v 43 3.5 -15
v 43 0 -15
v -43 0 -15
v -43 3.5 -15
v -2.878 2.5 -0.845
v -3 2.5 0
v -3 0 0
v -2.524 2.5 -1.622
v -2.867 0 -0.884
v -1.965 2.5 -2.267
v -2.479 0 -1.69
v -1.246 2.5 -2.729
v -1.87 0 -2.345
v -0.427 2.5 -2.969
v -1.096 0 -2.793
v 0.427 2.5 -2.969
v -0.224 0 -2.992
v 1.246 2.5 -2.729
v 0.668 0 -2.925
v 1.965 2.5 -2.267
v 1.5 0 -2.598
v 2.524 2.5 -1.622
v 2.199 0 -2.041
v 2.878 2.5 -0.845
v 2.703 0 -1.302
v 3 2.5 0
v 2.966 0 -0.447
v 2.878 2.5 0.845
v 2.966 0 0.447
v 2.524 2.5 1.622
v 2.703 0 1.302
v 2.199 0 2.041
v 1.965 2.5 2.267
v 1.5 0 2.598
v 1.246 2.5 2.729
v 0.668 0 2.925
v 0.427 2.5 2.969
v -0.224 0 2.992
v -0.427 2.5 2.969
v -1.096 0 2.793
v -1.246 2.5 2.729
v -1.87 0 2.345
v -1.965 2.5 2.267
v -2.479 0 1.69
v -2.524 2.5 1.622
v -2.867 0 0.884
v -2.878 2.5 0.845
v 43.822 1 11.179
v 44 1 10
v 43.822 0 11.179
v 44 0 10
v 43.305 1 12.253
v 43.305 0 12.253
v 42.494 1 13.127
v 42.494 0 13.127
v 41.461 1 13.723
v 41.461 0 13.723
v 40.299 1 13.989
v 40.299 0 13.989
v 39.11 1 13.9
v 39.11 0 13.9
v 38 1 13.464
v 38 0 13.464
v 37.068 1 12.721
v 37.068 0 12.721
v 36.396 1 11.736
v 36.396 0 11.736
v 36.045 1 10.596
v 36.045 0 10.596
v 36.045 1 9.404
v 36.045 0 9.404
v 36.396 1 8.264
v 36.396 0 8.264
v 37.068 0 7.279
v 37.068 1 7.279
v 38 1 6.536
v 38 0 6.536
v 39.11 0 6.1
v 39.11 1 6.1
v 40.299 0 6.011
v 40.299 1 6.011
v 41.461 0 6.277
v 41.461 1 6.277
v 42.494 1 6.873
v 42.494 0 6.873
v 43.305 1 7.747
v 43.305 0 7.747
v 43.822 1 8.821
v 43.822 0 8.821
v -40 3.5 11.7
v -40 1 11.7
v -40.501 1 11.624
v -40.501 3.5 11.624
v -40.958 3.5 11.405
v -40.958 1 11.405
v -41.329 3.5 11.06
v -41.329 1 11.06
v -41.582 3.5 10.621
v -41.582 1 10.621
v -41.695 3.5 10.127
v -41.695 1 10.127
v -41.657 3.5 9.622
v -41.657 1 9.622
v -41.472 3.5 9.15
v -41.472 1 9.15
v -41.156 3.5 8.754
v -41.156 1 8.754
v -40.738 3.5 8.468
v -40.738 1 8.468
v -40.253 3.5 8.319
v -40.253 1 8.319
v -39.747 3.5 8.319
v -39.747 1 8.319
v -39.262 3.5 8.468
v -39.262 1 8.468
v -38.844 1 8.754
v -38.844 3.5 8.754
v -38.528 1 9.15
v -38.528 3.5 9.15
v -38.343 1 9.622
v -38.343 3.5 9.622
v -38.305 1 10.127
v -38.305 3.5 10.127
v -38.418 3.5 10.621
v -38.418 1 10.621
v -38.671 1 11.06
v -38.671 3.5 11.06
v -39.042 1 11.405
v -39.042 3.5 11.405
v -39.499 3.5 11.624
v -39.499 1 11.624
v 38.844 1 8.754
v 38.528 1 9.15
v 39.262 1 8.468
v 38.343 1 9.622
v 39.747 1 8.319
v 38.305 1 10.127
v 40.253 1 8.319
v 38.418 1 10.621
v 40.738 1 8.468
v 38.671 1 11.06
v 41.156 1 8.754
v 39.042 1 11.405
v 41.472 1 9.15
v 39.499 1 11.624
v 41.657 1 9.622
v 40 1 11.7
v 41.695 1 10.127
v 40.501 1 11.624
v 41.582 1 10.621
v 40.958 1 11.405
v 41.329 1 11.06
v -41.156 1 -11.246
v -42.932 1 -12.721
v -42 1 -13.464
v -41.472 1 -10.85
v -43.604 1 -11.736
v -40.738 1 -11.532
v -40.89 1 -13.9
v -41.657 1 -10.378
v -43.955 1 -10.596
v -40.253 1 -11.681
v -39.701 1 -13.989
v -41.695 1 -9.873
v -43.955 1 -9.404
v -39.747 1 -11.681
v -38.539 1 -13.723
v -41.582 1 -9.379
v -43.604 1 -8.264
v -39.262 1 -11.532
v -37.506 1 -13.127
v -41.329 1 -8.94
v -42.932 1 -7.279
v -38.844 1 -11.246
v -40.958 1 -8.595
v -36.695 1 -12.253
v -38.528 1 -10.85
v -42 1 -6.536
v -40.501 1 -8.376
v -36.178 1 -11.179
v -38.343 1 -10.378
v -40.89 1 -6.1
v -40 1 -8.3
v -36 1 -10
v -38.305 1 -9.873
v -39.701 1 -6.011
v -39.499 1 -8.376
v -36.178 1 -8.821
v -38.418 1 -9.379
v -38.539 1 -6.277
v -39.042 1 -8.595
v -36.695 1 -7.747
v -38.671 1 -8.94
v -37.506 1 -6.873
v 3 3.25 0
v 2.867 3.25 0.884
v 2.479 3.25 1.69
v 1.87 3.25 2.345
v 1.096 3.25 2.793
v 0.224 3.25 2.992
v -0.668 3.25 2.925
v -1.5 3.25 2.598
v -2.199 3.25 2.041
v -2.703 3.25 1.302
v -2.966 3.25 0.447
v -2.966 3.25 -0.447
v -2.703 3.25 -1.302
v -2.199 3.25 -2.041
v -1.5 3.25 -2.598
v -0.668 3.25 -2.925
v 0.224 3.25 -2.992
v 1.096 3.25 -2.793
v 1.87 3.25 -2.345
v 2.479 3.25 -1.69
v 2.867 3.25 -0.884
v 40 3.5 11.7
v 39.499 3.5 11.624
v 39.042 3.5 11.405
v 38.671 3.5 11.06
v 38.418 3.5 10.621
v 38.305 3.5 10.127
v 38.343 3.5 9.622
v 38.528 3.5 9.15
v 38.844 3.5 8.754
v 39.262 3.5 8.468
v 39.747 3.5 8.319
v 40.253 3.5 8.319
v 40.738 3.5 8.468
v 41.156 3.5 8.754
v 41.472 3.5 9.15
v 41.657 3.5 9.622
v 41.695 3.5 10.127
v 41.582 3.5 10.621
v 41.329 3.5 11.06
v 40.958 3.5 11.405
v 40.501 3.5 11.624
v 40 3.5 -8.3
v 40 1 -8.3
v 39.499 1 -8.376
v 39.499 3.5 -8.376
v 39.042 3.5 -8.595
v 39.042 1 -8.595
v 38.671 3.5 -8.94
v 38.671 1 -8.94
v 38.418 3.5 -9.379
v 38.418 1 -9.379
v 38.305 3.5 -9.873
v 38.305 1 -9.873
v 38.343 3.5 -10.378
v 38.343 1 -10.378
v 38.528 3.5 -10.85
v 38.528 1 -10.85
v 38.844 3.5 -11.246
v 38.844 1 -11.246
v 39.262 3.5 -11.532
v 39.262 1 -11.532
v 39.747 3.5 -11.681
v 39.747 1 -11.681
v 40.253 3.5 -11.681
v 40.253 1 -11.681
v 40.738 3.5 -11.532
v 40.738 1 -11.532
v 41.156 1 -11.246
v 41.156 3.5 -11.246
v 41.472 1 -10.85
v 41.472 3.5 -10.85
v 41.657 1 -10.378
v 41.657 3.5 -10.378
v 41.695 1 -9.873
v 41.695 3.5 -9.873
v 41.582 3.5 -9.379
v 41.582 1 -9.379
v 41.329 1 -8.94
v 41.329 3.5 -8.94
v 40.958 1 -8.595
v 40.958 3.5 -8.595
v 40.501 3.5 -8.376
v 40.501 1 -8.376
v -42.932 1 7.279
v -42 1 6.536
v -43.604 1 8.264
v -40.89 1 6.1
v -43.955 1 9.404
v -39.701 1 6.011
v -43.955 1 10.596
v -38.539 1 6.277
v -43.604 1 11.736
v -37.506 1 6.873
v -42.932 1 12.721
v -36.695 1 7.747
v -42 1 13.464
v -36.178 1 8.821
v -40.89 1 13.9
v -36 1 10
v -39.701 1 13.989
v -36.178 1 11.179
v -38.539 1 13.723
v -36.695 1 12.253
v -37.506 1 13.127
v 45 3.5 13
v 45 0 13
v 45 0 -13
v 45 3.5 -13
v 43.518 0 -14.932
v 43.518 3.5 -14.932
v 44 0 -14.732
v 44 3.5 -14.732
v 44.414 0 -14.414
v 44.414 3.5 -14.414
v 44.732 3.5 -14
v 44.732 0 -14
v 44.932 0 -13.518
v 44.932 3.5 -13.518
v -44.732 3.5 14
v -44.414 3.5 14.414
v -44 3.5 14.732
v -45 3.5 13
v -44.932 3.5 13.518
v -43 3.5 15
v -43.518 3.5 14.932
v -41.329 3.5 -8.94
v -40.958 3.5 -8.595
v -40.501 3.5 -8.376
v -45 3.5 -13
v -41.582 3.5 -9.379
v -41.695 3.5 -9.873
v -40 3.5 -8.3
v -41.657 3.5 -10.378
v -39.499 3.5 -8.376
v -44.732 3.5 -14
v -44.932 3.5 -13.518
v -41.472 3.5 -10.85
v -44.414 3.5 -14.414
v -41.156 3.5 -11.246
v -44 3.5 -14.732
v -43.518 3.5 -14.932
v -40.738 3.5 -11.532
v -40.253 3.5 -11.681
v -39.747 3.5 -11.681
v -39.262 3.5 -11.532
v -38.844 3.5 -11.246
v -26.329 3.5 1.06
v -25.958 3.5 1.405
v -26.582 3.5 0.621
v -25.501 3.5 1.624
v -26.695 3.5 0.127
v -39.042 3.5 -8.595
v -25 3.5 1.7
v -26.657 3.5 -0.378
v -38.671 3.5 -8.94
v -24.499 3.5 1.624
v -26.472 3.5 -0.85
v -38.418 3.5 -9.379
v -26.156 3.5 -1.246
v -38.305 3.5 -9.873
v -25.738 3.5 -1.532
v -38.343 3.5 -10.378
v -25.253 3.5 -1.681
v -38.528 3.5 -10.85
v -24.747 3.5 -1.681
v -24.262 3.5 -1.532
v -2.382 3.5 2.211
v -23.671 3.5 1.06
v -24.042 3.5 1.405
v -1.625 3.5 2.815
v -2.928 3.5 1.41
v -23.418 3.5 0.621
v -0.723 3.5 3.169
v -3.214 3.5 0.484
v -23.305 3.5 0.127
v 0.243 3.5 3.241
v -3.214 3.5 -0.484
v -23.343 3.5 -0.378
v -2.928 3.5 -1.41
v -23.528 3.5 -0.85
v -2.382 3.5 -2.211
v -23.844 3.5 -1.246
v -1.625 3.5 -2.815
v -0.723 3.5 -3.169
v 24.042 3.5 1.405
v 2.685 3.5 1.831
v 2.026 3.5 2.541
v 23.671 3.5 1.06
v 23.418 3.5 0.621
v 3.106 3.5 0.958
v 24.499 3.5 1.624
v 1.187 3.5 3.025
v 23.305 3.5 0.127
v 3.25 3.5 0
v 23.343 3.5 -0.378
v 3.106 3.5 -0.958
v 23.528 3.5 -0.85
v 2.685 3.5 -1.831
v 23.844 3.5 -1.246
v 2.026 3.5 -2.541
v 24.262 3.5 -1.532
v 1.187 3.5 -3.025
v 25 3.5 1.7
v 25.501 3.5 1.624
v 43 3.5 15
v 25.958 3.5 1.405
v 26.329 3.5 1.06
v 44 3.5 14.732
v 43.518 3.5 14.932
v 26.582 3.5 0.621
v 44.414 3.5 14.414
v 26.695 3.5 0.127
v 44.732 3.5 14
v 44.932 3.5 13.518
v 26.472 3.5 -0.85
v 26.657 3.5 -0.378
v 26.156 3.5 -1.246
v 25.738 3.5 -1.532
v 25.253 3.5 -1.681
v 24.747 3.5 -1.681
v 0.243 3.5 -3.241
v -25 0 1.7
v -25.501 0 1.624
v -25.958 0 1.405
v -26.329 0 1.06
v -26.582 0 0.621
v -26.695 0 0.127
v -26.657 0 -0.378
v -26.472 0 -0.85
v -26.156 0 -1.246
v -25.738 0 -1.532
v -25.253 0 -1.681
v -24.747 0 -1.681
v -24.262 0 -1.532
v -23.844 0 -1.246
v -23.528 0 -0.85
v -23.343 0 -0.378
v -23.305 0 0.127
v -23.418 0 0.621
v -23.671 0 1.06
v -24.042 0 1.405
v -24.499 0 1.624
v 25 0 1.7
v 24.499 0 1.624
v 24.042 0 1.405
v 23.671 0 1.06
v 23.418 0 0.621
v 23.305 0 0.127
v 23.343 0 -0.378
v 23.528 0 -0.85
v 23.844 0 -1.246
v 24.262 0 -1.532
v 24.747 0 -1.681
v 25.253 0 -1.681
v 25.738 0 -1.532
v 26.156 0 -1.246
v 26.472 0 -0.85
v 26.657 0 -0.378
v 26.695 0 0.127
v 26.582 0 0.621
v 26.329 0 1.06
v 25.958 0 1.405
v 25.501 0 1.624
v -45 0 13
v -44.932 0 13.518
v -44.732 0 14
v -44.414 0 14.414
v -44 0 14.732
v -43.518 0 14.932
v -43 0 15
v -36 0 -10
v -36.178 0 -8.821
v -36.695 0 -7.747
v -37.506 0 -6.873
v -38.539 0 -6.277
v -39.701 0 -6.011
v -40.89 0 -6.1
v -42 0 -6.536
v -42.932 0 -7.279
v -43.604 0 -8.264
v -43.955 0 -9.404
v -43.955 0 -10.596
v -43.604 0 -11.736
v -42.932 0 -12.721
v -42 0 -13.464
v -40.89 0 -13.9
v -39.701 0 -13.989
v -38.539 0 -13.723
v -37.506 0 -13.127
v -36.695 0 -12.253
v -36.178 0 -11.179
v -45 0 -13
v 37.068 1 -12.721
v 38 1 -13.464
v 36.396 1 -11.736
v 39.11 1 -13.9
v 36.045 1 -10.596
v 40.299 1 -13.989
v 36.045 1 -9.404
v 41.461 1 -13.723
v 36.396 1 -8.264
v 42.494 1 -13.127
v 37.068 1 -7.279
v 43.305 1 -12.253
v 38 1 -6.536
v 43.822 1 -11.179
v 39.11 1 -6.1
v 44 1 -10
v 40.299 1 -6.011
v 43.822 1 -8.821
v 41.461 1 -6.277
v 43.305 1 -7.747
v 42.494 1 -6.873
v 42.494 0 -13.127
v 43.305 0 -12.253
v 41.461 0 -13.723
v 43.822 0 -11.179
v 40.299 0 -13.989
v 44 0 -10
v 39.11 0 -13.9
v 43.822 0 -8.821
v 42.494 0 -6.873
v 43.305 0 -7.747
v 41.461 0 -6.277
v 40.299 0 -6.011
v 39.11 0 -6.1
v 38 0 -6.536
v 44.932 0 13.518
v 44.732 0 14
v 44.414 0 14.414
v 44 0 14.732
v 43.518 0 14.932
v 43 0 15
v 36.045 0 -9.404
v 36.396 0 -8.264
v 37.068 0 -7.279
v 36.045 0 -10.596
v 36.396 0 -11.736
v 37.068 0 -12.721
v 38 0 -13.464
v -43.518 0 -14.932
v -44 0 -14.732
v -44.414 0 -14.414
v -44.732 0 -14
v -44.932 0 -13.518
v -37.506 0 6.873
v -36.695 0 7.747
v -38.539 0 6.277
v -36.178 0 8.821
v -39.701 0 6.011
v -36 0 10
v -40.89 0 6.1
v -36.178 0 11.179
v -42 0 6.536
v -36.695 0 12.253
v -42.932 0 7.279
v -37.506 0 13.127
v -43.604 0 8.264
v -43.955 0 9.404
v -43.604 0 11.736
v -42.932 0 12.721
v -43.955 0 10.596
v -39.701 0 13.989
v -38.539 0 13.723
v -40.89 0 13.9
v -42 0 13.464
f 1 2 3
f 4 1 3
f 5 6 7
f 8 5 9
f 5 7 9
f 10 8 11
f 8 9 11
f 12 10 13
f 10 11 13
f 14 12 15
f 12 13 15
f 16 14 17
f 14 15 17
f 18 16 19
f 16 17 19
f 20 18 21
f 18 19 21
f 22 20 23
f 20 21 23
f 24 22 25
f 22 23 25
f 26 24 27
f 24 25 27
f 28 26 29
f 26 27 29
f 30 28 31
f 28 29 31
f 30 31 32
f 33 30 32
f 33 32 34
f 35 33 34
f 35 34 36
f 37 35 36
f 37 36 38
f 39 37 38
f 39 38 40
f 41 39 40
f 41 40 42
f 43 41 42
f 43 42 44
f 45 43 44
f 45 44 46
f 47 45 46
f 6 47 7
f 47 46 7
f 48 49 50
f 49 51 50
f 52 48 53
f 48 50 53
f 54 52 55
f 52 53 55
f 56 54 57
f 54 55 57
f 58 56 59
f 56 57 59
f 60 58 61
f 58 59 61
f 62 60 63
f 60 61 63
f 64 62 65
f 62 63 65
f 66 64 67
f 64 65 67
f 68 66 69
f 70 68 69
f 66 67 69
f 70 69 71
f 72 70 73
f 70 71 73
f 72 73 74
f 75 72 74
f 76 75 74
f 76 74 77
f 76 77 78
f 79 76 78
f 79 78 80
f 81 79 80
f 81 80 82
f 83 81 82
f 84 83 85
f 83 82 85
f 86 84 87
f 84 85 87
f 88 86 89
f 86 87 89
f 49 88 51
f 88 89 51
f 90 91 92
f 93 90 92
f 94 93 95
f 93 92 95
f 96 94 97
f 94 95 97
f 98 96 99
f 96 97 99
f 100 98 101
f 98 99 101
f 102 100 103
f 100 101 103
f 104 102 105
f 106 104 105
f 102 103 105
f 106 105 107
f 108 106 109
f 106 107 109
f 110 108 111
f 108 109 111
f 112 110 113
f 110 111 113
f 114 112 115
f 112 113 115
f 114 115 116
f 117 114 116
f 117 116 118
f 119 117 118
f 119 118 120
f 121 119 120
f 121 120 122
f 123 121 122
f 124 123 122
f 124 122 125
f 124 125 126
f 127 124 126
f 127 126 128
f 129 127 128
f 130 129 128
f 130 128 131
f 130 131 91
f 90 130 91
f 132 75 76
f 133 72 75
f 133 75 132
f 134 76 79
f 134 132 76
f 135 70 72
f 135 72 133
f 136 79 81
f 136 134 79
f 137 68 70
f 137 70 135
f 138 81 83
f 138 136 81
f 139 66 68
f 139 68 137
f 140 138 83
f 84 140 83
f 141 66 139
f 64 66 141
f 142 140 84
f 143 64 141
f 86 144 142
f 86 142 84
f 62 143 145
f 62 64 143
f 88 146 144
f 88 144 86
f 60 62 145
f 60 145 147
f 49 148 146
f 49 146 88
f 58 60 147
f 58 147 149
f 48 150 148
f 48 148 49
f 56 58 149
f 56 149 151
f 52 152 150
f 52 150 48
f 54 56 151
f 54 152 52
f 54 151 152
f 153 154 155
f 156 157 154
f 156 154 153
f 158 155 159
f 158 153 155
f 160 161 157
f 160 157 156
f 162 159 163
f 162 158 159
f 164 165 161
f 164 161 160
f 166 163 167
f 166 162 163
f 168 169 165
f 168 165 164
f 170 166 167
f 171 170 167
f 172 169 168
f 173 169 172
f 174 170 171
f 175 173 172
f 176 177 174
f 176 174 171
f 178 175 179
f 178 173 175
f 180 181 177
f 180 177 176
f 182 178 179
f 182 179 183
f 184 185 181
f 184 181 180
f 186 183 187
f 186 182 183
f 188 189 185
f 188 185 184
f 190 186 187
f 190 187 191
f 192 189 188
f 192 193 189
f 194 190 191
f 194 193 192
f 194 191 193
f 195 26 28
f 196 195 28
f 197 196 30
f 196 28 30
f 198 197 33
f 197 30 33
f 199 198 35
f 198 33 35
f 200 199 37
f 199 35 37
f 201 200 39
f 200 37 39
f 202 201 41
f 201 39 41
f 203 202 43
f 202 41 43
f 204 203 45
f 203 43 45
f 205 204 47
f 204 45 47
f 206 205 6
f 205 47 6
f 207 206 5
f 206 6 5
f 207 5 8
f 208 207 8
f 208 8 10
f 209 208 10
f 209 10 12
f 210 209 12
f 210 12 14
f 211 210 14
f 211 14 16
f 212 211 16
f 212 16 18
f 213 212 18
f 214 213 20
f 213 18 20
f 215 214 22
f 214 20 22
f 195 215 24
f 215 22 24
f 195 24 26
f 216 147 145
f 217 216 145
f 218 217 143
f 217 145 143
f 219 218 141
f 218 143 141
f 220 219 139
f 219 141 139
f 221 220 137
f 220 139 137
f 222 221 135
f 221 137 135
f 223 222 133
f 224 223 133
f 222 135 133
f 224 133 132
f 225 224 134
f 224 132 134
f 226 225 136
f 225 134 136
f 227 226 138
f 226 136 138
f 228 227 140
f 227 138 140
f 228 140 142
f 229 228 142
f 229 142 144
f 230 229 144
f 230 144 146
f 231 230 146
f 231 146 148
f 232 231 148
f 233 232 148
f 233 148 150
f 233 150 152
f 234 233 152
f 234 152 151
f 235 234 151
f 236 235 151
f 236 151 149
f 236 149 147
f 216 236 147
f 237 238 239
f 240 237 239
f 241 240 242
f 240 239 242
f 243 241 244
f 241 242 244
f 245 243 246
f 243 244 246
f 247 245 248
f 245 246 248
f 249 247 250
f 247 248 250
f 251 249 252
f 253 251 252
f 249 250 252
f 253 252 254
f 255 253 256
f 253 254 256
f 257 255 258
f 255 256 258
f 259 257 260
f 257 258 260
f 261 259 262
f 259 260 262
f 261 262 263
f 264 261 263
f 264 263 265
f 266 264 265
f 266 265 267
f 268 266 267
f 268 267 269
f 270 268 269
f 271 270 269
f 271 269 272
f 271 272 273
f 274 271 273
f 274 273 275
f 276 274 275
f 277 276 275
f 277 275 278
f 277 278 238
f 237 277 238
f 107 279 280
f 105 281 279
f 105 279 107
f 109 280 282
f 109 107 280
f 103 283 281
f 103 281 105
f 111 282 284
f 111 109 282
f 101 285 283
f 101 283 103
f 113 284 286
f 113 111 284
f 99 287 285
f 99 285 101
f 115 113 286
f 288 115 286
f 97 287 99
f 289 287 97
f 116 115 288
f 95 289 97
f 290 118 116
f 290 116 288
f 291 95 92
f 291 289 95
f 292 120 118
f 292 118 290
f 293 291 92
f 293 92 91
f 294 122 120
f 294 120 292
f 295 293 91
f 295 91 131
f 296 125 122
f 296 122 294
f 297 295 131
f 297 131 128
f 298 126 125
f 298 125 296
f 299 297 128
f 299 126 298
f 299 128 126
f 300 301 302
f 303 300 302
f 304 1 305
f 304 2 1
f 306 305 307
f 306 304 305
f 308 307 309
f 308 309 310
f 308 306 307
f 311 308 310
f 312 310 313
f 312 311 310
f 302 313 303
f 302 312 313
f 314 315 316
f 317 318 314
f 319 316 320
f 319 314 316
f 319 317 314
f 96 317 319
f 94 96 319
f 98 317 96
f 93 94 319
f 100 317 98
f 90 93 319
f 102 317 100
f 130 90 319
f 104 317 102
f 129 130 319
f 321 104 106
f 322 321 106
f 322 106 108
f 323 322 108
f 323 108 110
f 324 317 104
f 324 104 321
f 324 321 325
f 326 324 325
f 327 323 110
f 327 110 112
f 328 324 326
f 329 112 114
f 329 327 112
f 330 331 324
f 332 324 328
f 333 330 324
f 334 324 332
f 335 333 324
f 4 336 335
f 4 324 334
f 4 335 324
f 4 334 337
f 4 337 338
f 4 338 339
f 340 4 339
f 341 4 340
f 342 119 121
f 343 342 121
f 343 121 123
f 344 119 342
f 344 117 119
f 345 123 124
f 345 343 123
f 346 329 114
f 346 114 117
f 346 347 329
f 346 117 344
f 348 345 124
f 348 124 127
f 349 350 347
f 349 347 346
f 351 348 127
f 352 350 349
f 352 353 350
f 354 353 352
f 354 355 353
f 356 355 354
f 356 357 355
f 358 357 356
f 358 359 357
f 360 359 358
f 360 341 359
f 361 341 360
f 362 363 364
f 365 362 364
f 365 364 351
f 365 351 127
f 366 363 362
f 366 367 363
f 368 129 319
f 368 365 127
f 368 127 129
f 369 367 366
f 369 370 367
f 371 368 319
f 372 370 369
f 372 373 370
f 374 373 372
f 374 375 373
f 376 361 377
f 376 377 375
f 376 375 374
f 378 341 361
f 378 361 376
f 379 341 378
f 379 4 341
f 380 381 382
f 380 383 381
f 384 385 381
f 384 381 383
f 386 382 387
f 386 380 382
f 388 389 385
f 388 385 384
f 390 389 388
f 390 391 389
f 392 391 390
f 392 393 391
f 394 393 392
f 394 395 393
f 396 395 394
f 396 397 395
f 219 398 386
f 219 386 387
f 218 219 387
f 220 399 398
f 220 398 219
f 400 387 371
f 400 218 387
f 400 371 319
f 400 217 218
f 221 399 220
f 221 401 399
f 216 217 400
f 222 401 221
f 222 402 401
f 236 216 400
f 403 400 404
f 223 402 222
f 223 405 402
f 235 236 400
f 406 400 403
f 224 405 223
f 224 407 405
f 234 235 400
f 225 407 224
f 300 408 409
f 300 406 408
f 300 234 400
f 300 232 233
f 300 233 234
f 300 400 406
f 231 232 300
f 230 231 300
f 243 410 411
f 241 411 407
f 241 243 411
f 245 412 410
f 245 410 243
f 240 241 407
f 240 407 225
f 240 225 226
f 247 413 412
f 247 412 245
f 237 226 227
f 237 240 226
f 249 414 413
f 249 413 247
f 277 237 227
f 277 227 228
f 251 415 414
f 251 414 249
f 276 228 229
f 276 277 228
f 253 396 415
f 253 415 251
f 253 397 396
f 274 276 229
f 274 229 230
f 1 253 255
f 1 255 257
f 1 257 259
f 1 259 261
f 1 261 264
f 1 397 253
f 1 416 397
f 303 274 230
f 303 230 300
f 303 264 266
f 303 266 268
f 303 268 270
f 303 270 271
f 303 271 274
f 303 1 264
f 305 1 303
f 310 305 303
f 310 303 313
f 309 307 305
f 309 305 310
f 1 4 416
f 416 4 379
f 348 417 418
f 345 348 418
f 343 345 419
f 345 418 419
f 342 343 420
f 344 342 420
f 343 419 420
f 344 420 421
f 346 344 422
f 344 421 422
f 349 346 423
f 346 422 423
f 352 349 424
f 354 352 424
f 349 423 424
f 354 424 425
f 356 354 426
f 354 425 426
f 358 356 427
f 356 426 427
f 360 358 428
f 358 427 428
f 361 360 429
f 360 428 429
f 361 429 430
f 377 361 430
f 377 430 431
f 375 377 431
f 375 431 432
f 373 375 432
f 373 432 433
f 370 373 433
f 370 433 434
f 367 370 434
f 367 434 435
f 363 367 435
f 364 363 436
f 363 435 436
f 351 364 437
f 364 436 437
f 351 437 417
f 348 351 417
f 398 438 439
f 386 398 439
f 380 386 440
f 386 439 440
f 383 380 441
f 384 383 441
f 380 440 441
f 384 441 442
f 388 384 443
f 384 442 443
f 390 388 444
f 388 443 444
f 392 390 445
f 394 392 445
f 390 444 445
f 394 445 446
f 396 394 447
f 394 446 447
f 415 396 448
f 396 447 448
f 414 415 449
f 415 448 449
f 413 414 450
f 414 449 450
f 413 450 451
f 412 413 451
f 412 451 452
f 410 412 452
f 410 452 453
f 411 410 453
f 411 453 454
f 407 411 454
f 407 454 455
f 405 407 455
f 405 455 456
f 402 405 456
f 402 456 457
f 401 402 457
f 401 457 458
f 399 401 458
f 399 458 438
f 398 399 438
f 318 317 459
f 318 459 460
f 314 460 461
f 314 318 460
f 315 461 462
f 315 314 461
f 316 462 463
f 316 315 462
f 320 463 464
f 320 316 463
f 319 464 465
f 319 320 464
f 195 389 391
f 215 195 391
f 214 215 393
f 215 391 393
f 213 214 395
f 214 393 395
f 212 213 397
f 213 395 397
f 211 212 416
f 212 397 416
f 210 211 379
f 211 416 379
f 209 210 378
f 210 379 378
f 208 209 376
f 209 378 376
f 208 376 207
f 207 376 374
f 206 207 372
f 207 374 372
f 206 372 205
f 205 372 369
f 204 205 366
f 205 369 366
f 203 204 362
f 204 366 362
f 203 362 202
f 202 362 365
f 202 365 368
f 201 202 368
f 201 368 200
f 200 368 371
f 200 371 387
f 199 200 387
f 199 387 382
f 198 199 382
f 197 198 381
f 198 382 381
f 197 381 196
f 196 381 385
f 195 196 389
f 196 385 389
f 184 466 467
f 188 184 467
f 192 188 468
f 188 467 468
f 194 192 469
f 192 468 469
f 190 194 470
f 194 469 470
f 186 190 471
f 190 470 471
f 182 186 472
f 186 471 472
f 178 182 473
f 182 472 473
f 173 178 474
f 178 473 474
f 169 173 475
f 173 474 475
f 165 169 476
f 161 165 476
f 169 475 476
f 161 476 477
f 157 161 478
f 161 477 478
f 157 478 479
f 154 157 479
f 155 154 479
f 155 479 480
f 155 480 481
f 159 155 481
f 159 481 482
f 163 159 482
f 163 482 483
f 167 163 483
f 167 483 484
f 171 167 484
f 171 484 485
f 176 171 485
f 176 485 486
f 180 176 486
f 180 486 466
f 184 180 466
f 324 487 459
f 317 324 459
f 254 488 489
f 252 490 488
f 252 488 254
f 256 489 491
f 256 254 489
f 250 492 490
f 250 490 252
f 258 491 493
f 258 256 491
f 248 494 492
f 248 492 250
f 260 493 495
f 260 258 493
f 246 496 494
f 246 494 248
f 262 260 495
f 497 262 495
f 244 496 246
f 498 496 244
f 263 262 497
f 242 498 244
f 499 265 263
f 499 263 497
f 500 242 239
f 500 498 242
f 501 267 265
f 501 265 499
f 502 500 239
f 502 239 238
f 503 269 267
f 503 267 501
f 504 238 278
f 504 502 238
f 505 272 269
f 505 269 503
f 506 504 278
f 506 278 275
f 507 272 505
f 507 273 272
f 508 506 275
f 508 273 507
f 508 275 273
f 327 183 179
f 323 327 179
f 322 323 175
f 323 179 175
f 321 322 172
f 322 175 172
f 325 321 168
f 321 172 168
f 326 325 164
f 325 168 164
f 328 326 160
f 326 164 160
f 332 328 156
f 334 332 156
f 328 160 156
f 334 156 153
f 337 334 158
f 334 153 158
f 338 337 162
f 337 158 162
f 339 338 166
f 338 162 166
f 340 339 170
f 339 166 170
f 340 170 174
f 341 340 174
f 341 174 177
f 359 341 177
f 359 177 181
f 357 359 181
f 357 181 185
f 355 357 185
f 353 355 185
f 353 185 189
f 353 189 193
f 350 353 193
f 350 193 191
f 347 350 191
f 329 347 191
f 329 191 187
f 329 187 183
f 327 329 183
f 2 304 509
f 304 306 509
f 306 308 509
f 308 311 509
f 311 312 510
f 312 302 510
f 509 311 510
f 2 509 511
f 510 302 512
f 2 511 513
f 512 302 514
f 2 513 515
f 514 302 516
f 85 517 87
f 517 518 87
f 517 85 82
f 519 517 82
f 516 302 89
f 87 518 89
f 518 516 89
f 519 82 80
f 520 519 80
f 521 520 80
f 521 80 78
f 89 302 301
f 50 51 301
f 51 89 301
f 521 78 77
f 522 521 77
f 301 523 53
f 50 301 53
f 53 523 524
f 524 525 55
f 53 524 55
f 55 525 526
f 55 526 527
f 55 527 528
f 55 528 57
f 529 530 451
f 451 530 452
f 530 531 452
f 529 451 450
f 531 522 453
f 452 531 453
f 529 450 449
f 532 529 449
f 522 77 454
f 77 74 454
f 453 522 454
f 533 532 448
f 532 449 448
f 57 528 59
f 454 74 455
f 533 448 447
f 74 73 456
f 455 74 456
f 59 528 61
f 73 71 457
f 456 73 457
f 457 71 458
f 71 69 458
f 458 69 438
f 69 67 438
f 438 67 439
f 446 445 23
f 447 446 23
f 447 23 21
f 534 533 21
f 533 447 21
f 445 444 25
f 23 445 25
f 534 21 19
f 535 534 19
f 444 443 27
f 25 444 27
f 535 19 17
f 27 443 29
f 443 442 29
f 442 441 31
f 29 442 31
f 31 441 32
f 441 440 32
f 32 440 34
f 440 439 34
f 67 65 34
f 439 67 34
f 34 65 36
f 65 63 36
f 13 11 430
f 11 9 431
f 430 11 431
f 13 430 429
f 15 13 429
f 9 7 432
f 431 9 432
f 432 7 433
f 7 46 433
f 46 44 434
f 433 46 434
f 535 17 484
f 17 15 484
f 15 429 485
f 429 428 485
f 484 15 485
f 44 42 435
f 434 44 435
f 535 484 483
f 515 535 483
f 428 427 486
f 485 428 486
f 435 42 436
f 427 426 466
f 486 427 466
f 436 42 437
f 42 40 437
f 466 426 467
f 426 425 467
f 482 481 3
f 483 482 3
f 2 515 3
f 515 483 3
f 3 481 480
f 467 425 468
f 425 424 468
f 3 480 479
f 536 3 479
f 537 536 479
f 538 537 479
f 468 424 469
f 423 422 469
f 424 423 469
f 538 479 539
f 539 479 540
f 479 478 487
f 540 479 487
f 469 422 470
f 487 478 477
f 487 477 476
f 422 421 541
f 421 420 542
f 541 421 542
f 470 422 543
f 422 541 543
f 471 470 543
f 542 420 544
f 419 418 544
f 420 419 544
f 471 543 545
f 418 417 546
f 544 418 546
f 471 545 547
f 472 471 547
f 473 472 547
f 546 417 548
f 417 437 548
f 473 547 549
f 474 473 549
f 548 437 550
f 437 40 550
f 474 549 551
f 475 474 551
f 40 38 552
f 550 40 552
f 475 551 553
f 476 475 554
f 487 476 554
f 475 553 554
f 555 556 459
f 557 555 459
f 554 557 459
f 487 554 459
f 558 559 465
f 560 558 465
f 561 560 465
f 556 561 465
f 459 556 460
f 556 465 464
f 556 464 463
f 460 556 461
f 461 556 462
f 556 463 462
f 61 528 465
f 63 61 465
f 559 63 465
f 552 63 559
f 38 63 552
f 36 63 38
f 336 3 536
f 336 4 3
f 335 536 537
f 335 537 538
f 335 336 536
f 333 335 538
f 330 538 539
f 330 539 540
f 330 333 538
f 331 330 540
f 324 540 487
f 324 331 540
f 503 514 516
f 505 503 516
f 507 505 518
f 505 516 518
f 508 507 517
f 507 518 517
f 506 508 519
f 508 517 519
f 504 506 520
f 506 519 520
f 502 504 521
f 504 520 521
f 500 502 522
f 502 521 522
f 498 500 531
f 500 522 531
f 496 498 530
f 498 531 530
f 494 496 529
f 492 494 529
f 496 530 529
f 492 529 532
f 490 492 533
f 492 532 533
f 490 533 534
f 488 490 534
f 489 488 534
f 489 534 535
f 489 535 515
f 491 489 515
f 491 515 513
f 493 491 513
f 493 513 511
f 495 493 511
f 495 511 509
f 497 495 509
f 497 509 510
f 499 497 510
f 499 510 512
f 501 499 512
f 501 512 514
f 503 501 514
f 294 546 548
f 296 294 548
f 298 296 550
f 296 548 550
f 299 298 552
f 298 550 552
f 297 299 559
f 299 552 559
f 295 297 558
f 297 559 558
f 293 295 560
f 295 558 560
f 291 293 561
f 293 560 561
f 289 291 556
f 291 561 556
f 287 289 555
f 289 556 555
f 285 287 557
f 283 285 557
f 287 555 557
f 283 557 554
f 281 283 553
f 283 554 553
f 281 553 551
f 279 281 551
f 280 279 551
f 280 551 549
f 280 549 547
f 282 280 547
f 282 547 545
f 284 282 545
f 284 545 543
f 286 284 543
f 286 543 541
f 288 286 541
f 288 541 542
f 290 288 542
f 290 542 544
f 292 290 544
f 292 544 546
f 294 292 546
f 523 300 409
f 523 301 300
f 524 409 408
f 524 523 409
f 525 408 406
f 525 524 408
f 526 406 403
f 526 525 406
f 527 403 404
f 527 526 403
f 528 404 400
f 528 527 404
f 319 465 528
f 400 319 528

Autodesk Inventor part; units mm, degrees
ref_plane "YZ Plane" through (0, 0, 0) normal (1, 0, 0) x (0, 1, 0)
ref_plane "XZ Plane" through (0, 0, 0) normal (0, 1, 0) x (-1, 0, 0)
ref_plane "XY Plane" through (0, 0, 0) normal (0, 0, 1) x (1, 0, 0)
sketch "Sketch1" plane through (0, 0, 0) normal (0, 1, 0) x (-1, 0, 0)
  circle A0 centre (0, 0) radius 8 construction
  circle A1 centre (0, 0) radius 3
  line L0 (45, 15) -> (-45, 15)
  line L1 (-45, 15) -> (-45, -15)
  line L2 (-45, -15) -> (45, -15)
  line L3 (45, -15) -> (45, 15)
  line L4 (0, -21) -> (0, 21) projected
  point P0 (0, 15)
  dimension "d0" = 16
  dimension "d3" = 6
  dimension "d4" = 90
  dimension "d5" = 30
  dimension "d6" = 15
extrude "Extrusion1" add sketch "Sketch1" along normal blind 2.5 contours A1 L4 L0 L3 L2 | A1 L4 L2 L1 L0
sketch "Sketch2" plane through (0, 2.5, 0) normal (0, 1, 0) x (1, 0, 0)
  line L0 (-45, 15) -> (-45, -15) projected
  line L1 (-45, -15) -> (45, -15) projected
  line L2 (45, -15) -> (45, 15) projected
  line L3 (45, 15) -> (-45, 15) projected
  circle A0 centre (0, 0) radius 3 projected
extrude "Extrusion2" add sketch "Sketch2" along normal blind 1
sketch "Sketch7" plane through (0, 0, 0) normal (0, -1, 0) x (1, 0, 0)
  circle A0 centre (-40, 10) radius 4
  line L0 (-45, 15) -> (45, 15) projected
  line L1 (-45, -15) -> (-45, 15) projected
  circle A1 centre (40, 10) radius 4
  circle A2 centre (-40, -10) radius 4
  circle A3 centre (40, -10) radius 4
  point P0 (0, 0)
  dimension "d34" = 8
  dimension "d35" = 5
  dimension "d36" = 5
  dimension "d39" = 80
  dimension "d42" = 20
extrude "Extrusion4" cut sketch "Sketch7" against normal blind 1
sketch "Sketch9" plane through (0, 3.5, 0) normal (0, 1, 0) x (1, 0, 0)
  circle A0 centre (-40, -10) radius 4 construction
  point P0 (0, 0)
hole "Hole2" at (-40, 3.5, 10) direction (0, -1, 0) diameter 3.4 end through all clearance for "Socket Head Cap Screw ISO 4762" size "M3" standard "ISO"
pattern_linear "Rectangular Pattern1" count 2 spacing 20 along (0, 0, -1) count 2 spacing 80 along (1, 0, 0) of "Hole2"
chamfer "Chamfer2" distance 0.25 angle 45 1 edges at (-3, 3.5, 0)
sketch "Sketch11" plane through (0, 3.5, 0) normal (0, 1, 0) x (1, 0, 0)
  line L0 (-25, 0) -> (25, 0) construction
  point P0 (0, 0)
  point P1 (0, 0)
  dimension "d73" = 50
hole "Hole3" at (-25, 3.5, 0) at (25, 3.5, 0) direction (0, -1, 0) diameter 3.4 end through all clearance for "Socket Head Cap Screw ISO 4762" size "M3" standard "ISO"
fillet "Fillet1" radius 2 4 edges at (-45, 1.75, 15) (45, 1.75, 15) (45, 1.75, -15) (-45, 1.75, -15)
properties part number "motor mount plate  for print"
